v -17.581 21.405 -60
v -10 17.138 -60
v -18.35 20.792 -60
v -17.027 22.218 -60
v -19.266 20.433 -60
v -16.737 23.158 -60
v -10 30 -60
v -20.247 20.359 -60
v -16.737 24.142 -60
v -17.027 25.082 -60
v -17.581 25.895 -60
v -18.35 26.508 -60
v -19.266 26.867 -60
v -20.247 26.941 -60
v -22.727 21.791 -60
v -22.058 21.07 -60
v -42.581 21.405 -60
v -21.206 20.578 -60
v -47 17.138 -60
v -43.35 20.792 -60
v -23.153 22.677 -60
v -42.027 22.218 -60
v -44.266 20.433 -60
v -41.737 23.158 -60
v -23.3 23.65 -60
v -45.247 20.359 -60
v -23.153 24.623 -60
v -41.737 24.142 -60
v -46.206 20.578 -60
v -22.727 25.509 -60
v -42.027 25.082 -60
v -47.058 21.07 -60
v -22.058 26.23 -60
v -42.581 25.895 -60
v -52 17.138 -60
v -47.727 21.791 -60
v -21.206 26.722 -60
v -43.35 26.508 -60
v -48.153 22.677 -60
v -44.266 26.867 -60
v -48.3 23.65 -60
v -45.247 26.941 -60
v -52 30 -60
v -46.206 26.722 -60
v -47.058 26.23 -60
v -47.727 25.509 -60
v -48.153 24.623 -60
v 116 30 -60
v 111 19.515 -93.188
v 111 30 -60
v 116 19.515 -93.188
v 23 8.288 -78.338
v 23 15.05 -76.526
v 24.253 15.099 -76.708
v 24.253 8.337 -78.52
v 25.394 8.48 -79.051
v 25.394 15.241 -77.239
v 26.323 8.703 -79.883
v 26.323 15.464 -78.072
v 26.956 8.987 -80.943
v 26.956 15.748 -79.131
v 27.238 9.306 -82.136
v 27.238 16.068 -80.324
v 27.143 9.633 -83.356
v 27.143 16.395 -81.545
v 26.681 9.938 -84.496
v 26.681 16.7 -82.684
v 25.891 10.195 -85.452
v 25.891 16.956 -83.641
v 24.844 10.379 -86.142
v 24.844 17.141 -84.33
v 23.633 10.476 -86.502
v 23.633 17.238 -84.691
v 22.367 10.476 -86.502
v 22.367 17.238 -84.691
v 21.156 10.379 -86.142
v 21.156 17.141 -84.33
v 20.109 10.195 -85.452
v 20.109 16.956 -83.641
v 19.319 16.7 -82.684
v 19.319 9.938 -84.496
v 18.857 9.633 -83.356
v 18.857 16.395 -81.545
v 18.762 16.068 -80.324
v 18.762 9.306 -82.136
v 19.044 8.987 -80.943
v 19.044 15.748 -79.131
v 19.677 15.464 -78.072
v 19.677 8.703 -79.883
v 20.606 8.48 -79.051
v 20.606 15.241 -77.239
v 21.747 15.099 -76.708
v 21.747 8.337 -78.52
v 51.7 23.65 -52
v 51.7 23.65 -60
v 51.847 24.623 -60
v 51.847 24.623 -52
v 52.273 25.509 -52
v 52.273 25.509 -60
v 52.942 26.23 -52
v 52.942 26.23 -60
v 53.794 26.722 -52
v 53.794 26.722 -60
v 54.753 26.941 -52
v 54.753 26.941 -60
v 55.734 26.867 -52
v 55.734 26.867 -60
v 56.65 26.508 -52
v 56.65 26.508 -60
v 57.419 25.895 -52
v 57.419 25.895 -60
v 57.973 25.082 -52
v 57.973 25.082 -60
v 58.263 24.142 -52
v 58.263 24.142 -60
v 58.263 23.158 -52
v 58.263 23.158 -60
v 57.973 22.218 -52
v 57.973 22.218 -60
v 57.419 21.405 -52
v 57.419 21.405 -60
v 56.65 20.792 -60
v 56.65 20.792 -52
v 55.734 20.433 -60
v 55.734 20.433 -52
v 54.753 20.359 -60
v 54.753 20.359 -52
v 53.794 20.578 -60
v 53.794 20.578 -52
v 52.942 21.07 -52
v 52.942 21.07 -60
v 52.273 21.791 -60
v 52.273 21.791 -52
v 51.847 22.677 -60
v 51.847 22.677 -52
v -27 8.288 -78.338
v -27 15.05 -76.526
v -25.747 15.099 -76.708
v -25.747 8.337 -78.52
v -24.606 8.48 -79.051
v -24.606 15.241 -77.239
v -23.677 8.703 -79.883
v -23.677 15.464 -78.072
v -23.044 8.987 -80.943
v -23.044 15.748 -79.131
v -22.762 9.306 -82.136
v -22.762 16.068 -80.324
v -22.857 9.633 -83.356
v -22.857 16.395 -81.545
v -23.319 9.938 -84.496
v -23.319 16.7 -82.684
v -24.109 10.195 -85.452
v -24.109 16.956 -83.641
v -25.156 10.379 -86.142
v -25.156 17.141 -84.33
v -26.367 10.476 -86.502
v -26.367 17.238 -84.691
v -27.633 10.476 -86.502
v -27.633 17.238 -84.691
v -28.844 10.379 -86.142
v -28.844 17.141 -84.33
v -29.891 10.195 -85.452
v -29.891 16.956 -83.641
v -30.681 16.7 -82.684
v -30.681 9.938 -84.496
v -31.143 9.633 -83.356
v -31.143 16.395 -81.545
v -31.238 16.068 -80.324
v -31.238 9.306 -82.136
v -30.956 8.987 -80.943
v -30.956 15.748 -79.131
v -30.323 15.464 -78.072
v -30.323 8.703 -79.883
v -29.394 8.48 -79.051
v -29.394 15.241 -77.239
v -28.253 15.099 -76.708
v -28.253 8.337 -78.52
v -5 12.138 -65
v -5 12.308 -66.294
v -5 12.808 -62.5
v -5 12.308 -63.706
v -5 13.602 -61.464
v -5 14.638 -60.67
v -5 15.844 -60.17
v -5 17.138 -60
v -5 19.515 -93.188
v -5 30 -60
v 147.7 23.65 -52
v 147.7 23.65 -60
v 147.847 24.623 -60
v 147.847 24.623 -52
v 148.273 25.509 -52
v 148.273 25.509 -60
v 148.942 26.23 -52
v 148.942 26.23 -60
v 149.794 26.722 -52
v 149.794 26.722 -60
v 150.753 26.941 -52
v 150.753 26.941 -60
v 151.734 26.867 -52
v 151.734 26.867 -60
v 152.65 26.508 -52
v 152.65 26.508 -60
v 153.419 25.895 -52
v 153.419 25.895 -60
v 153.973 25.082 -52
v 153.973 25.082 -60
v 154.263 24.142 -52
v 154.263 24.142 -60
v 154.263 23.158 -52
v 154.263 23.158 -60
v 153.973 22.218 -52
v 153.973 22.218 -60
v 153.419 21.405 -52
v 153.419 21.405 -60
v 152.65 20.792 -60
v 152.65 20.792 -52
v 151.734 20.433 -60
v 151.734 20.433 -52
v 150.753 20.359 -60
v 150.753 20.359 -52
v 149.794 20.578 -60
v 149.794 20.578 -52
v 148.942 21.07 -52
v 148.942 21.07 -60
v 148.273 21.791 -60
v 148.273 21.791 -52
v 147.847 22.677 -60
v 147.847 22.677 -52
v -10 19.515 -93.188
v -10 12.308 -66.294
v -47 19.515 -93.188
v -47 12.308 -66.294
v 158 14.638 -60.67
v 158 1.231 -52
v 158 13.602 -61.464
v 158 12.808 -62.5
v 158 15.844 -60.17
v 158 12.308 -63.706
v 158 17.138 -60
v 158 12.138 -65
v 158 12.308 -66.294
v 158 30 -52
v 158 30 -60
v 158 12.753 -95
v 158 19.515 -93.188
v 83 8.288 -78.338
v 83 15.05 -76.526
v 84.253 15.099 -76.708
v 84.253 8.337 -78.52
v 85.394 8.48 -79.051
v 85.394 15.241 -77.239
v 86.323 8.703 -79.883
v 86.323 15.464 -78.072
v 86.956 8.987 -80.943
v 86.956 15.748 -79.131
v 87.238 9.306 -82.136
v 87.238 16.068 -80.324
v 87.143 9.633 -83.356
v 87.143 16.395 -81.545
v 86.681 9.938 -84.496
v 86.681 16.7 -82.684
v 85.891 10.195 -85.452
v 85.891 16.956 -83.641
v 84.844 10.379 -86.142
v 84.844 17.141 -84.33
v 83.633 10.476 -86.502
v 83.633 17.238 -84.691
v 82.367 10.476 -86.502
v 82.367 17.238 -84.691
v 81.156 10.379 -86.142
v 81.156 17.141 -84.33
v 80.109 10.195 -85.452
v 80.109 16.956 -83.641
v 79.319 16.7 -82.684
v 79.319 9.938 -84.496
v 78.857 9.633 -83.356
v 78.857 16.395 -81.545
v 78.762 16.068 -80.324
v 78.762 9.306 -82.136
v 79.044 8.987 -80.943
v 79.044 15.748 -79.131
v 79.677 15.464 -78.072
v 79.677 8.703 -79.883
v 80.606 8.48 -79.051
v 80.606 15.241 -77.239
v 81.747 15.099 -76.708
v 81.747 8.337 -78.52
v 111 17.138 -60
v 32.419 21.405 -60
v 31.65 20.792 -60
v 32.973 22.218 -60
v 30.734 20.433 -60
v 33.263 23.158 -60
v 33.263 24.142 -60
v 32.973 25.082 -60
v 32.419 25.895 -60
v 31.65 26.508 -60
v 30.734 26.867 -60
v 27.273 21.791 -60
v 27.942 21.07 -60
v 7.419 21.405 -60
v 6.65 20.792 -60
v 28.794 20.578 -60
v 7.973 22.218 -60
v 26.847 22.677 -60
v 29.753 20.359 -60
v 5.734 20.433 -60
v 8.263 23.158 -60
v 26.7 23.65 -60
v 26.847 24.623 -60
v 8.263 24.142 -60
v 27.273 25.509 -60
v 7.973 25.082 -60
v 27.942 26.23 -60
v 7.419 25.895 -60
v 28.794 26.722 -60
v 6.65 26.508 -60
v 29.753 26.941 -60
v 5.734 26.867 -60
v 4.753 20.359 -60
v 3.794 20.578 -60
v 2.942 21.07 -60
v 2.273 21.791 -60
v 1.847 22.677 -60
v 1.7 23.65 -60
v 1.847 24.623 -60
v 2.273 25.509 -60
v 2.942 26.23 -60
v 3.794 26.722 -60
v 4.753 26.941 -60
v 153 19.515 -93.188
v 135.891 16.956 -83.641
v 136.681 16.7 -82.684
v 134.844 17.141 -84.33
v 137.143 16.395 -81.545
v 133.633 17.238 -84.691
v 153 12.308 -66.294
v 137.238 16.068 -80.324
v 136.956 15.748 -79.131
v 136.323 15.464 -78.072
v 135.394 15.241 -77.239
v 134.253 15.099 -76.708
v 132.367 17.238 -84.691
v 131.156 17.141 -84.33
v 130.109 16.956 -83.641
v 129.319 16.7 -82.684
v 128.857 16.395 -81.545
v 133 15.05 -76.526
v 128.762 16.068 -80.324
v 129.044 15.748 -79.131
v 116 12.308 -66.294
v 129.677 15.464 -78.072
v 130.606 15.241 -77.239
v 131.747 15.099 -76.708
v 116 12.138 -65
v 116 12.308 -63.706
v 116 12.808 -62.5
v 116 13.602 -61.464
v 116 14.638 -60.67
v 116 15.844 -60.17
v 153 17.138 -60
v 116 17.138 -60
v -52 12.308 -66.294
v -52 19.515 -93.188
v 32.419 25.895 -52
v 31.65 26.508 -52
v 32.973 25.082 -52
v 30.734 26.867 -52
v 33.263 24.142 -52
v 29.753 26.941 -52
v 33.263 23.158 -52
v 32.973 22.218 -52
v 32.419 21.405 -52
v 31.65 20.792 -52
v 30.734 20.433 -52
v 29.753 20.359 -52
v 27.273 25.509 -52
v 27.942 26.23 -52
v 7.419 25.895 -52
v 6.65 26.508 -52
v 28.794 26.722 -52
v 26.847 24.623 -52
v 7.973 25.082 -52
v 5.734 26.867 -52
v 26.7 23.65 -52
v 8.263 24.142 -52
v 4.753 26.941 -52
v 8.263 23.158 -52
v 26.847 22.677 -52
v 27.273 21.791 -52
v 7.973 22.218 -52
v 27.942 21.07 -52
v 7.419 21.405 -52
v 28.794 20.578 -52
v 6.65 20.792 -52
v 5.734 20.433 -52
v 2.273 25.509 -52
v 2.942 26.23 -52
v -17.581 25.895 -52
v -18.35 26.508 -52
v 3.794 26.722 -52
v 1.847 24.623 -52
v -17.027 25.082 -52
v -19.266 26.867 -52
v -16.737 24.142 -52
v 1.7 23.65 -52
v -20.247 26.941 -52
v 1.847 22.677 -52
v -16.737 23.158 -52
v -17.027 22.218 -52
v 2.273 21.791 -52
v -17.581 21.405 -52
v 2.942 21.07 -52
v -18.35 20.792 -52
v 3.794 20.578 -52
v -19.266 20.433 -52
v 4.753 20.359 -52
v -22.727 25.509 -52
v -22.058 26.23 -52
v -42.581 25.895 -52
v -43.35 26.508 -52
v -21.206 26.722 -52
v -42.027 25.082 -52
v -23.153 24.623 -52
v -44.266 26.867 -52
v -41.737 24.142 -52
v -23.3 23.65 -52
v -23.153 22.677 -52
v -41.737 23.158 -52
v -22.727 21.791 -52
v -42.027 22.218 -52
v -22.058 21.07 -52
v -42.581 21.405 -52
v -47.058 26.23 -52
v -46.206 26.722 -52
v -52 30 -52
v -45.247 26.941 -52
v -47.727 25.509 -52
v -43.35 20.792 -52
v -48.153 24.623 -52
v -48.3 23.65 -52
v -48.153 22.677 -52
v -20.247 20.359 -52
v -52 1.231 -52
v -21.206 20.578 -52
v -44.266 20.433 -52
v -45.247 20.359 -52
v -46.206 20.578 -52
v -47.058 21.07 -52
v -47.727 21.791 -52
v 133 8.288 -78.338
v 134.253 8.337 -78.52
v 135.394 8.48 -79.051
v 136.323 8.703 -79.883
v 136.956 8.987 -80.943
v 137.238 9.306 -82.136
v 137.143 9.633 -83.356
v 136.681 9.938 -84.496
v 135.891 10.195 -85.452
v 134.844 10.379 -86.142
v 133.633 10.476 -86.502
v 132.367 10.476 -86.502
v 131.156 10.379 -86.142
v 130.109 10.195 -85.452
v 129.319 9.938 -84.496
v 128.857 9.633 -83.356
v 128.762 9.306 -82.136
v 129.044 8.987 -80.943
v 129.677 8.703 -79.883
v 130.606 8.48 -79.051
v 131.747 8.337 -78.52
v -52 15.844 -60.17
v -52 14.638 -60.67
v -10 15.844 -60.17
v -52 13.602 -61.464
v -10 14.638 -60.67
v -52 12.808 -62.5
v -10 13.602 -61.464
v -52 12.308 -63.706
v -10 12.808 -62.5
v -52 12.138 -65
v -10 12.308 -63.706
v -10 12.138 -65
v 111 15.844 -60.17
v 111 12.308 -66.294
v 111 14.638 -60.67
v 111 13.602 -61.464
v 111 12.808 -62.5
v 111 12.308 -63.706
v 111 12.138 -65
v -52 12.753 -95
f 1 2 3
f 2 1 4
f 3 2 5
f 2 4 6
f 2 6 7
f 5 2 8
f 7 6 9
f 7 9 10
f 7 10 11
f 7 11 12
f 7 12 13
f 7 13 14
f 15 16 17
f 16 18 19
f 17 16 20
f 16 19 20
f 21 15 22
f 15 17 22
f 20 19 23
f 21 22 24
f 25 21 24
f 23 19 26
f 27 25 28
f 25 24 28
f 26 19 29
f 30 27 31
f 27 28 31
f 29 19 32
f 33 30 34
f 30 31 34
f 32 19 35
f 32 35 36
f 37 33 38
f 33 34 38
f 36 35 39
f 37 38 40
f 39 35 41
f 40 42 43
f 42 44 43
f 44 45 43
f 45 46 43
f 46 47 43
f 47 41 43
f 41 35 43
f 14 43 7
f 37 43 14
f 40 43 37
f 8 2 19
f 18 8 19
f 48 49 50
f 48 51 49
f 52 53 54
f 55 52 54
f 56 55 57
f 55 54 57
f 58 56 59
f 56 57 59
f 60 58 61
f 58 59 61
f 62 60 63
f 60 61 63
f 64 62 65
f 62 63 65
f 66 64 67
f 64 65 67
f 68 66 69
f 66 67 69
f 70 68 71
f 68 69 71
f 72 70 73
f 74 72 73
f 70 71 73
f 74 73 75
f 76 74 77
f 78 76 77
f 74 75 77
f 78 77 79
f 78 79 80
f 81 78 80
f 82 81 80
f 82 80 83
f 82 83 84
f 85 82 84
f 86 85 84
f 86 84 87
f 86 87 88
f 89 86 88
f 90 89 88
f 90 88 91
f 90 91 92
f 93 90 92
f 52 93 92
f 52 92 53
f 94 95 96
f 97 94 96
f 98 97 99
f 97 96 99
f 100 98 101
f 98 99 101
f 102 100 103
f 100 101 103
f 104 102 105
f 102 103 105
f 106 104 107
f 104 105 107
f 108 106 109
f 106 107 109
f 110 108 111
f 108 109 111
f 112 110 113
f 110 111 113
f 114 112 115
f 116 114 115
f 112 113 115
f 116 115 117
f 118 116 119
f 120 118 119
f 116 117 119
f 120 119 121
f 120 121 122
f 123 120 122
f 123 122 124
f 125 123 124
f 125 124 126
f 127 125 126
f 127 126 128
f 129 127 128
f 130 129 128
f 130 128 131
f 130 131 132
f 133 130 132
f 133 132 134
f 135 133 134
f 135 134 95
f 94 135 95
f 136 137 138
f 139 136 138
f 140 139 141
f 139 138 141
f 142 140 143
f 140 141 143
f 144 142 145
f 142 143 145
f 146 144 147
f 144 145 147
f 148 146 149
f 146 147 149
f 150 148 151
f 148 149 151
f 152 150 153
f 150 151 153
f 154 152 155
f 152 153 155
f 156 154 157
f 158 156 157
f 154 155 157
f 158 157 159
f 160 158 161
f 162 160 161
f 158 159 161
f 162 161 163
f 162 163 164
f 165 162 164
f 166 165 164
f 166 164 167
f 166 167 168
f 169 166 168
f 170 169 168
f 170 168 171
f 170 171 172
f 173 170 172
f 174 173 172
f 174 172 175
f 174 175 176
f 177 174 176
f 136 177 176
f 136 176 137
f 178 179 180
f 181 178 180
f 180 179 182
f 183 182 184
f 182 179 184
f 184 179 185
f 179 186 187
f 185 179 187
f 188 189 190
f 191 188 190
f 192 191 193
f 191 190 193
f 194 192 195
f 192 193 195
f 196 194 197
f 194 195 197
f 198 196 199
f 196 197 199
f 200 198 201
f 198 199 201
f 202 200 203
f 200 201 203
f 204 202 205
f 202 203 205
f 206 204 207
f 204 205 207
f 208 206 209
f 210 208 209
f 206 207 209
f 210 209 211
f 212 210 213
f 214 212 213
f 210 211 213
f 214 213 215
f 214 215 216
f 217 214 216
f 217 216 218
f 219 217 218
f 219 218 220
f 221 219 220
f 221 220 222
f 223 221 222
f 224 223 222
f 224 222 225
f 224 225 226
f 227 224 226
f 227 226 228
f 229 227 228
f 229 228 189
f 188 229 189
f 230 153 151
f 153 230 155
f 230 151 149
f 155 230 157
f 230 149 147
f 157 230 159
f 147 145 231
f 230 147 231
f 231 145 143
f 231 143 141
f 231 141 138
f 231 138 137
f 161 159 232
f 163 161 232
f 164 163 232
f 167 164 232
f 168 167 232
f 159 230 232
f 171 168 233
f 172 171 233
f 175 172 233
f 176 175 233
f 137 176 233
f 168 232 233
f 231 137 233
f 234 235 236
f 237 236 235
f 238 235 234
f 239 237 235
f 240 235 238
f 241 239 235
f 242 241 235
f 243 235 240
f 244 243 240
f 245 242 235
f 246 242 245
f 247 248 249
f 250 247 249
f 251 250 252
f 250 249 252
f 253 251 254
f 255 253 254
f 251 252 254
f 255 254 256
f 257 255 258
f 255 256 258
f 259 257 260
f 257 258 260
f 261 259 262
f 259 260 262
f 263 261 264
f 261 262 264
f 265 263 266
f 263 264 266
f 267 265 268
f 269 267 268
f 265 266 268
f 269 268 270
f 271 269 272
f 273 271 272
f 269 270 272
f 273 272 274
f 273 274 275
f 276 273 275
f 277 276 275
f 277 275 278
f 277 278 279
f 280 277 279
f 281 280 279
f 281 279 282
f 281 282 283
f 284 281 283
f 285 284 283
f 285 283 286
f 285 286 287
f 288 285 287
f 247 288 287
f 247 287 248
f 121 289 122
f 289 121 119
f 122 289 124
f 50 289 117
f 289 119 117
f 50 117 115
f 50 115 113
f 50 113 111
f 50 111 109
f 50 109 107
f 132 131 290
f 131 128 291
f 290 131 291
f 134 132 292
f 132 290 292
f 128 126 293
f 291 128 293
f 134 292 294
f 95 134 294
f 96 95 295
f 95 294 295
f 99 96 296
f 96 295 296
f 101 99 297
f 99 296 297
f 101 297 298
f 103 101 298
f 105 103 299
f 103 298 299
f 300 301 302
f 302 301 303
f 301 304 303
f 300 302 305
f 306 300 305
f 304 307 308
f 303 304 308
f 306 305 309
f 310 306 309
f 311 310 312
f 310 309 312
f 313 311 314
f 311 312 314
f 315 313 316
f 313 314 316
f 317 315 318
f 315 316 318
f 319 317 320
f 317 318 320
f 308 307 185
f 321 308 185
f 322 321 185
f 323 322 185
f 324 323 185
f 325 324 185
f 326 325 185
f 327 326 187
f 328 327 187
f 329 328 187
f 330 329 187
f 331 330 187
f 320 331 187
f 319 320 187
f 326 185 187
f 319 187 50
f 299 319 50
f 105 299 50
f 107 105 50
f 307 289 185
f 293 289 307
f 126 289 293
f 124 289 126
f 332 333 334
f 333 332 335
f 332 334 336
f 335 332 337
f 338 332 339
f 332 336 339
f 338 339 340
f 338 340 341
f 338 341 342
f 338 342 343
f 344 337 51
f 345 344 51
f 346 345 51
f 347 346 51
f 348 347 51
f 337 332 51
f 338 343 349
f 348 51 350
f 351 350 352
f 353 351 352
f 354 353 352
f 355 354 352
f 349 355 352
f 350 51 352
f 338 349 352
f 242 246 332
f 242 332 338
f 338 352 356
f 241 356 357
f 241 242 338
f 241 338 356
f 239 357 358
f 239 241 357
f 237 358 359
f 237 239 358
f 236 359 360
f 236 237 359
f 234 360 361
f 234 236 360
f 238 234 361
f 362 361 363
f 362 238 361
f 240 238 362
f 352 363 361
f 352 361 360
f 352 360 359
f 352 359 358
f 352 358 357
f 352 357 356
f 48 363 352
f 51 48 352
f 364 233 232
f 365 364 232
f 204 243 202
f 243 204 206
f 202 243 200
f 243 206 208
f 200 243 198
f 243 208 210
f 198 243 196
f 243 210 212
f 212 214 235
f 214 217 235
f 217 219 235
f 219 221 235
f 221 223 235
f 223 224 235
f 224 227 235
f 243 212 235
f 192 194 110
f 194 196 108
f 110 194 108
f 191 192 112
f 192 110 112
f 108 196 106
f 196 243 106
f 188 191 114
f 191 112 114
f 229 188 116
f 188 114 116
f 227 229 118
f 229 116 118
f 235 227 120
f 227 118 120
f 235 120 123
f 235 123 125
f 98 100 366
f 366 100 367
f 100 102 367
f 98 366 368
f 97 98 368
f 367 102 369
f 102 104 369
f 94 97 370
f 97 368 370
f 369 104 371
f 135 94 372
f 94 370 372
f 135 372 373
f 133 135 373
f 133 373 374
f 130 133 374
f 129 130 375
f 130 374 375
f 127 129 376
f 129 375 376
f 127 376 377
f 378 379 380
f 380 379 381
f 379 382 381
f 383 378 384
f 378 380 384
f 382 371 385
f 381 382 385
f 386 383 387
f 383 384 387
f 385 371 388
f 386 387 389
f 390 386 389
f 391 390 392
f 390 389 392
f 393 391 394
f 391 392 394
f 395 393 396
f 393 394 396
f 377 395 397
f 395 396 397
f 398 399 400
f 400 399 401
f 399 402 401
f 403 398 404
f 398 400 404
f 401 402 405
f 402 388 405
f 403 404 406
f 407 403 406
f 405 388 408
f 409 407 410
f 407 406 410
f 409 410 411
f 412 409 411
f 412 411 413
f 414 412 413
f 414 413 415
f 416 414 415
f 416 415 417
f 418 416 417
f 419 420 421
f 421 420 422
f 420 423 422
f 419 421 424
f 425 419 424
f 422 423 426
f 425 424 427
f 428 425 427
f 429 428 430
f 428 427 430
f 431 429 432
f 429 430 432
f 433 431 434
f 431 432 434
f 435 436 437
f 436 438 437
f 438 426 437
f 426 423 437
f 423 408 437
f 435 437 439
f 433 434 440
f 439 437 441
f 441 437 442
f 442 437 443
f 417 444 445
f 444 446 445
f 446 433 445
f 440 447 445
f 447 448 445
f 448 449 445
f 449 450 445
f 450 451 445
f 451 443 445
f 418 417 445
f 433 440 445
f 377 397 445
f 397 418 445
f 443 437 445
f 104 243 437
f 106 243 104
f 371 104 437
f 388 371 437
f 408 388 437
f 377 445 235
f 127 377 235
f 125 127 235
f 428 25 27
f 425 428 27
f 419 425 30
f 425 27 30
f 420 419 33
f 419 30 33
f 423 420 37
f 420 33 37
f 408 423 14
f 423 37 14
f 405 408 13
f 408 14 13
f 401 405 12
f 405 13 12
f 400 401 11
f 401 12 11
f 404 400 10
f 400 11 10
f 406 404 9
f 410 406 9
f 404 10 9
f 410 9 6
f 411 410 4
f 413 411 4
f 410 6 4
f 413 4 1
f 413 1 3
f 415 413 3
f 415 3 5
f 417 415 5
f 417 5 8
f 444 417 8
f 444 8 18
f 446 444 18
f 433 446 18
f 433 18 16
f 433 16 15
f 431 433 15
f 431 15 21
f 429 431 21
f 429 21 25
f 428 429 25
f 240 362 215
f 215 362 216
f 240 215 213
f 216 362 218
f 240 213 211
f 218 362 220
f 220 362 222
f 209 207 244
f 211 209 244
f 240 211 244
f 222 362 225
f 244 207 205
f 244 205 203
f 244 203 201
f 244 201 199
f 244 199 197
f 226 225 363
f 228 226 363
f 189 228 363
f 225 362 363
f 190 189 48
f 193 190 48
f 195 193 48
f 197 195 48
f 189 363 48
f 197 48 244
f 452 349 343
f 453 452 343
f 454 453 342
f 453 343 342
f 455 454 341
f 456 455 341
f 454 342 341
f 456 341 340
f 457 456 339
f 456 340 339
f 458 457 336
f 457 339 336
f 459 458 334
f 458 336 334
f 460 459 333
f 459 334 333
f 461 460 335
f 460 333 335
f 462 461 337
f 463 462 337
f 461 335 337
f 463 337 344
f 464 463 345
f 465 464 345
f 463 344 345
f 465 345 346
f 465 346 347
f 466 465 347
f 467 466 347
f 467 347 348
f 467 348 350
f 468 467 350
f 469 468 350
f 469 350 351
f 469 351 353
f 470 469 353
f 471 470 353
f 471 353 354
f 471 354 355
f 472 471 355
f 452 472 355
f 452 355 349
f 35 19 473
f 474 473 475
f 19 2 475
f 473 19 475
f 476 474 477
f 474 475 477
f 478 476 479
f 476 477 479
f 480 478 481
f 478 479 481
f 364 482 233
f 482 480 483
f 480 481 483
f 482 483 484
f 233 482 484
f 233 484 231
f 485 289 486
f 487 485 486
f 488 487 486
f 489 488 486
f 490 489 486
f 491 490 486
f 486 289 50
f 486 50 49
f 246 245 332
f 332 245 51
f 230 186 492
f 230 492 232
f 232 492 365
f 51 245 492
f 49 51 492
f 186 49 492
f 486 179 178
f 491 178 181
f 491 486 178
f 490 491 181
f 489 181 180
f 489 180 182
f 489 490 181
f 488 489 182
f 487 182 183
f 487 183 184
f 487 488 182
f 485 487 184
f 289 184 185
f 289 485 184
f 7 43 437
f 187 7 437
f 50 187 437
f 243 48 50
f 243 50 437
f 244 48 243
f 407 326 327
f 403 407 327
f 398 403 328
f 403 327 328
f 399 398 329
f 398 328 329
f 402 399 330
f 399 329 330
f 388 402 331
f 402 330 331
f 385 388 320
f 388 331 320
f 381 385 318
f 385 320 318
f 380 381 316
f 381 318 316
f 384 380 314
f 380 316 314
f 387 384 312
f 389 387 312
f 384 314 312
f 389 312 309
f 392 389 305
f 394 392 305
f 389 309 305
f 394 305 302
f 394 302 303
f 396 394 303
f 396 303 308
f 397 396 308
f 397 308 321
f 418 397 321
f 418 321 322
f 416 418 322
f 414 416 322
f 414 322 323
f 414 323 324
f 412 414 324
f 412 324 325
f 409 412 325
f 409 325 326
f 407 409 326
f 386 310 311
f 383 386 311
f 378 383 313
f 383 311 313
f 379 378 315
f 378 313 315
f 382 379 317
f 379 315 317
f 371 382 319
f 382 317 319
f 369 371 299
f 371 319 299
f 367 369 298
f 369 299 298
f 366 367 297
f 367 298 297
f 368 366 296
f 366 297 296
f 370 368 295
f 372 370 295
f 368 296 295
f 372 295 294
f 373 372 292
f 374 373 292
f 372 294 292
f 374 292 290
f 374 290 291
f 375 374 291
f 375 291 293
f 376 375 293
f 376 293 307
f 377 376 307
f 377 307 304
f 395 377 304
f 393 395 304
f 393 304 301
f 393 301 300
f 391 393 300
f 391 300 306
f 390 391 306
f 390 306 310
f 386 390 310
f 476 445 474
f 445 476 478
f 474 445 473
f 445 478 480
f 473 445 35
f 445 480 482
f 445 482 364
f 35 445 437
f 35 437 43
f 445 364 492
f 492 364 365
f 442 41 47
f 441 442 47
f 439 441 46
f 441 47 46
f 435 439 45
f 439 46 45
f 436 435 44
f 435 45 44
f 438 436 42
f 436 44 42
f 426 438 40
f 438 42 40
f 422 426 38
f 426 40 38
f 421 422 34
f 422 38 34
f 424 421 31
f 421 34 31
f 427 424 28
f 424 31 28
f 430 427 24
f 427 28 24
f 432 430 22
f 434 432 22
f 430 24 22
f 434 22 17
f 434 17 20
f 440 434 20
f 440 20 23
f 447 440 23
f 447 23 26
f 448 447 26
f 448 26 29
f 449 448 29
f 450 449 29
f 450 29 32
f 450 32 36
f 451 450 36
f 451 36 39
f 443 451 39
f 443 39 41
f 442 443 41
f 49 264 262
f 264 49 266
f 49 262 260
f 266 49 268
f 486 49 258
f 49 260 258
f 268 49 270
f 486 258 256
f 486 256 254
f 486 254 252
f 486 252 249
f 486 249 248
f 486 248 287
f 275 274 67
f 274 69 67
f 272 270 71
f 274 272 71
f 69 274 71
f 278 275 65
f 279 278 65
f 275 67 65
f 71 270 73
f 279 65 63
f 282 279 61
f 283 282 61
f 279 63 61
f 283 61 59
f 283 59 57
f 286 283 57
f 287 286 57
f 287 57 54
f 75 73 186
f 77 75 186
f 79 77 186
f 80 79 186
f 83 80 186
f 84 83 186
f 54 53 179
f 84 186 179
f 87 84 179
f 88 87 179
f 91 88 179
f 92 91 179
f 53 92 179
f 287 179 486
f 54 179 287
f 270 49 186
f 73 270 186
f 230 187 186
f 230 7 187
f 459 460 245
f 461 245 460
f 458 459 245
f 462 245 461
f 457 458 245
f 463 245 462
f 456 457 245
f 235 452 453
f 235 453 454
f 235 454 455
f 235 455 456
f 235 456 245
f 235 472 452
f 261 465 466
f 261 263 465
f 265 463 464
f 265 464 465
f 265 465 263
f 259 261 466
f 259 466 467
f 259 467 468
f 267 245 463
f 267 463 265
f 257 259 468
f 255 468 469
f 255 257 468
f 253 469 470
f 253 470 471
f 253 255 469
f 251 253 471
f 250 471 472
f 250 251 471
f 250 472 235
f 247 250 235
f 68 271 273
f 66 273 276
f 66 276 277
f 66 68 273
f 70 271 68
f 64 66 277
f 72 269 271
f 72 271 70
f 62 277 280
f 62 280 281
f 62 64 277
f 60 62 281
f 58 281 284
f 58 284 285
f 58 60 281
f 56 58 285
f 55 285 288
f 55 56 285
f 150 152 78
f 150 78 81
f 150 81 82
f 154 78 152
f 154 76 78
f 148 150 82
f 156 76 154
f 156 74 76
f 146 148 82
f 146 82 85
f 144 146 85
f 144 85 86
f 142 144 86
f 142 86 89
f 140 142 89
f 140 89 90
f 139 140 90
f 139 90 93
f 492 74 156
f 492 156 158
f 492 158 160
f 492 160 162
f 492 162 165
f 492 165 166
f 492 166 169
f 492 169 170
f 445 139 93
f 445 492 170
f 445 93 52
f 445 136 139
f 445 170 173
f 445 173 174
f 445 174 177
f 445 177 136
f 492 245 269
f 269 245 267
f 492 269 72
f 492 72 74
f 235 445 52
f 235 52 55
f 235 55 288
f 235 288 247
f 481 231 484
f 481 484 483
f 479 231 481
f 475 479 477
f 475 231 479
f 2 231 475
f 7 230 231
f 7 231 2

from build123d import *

# Parameters (mm, degrees)
EXTRUDE_1_DEPTH      = 30
SKETCH_2_R           = 44.45
CUT_EXTRUDE_1_DEPTH  = 4
SKETCH_3_R           = 25.5
SKETCH_3_R_2         = 2.25
CUT_EXTRUDE_2_DEPTH  = 188.619295383
CUT_EXTRUDE_3_DEPTH  = 189.215302247
SKETCH_5_R           = 1.65
CUT_EXTRUDE_4_DEPTH  = 189.215302247
EXTRUDE_START        = -30
EXTRUDE_2_DEPTH      = 30
CUT_EXTRUDE_5_DEPTH  = 198.040604952
CUT_EXTRUDE_7_DEPTH  = 233.432785983
CUT_EXTRUDE_8_DEPTH  = 233.432785983
CUT_EXTRUDE_9_DEPTH  = 233.432785983
FILLET_1_R           = 5
CUT_EXTRUDE_10_DEPTH = 233.432785983
EXTRUDE_START_2      = -5
EXTRUDE_3_DEPTH      = 5
EXTRUDE_4_DEPTH      = 5
SKETCH_14_R          = 4.25
CUT_EXTRUDE_11_DEPTH = 189.364728478
SKETCH_16_W          = 43
SKETCH_16_H          = 30
CUT_EXTRUDE_12_DEPTH = 233.432785983
EXTRUDE_7_REACH      = 188.592
SKETCH_18_W          = 210
SKETCH_18_H          = 5
EXTRUDE_8_DEPTH      = 210
EXTRUDE_9_DEPTH      = 5
EXTRUDE_10_DEPTH     = 5
SKETCH_22_R          = 4.25
CUT_EXTRUDE_13_DEPTH = 187.984035343
FILLET_2_R           = 5
CUT_EXTRUDE_14_DEPTH = 234.418610938
EXTRUDE_11_DEPTH     = 2.5
EXTRUDE_12_DEPTH     = 2.5
CUT_EXTRUDE_START    = -5
CUT_EXTRUDE_15_DEPTH = 5
SKETCH_24_R          = 3.3
CUT_EXTRUDE_16_DEPTH = 165.58736282
CUT_EXTRUDE_17_DEPTH = 5


with BuildPart() as part:
    # 草图1 → 凸台-拉伸1 (new body)
    with BuildSketch(Plane(origin=(0, 0, 0), x_dir=(1, 0, 0), z_dir=(0, 1, 0))):
        with BuildLine():
            Line((170, 31.93), (170, -31.93))
            ThreePointArc((170, -31.93), (167.781993847, -38.210172909), (162.111885646, -41.704453387))
            Line((162.111885646, -41.704453387), (15.839142344, -73.308400404))
            ThreePointArc((15.839142344, -73.308400404), (-75, 0), (15.839142344, 73.308400404))
            Line((15.839142344, 73.308400404), (162.111885646, 41.704453387))
            ThreePointArc((162.111885646, 41.704453387), (167.781993847, 38.210172909), (170, 31.93))
        make_face()
    extrude(amount=EXTRUDE_1_DEPTH)

    # 草图2 → 切除-拉伸1 (cut)
    with BuildSketch(Plane(origin=(0, 30, 0), x_dir=(1, 0, 0), z_dir=(0, 1, 0))):
        with Locations(Location((0, 0, 0), (0, 0, 270))):
            Circle(SKETCH_2_R)
    extrude(amount=-CUT_EXTRUDE_1_DEPTH, mode=Mode.SUBTRACT)

    # 草图3 → 切除-拉伸2 (cut, through all)
    with BuildSketch(Plane(origin=(0, 26, 0), x_dir=(1, 0, 0), z_dir=(0, 1, 0))):
        with Locations(Location((0, 0, 0), (0, 0, 270))):
            Circle(SKETCH_3_R)
        with Locations(Location((0, 41, 0), (0, 0, 270))):
            Circle(SKETCH_3_R_2)
        with Locations(Location((28.991378029, 28.991378029, 0), (0, 0, 270))):
            Circle(SKETCH_3_R_2)
        with Locations(Location((41, 0, 0), (0, 0, 270))):
            Circle(SKETCH_3_R_2)
        with Locations(Location((28.991378029, -28.991378029, 0), (0, 0, 270))):
            Circle(SKETCH_3_R_2)
        with Locations(Location((0, -41, 0), (0, 0, 270))):
            Circle(SKETCH_3_R_2)
        with Locations(Location((-28.991378029, -28.991378029, 0), (0, 0, 270))):
            Circle(SKETCH_3_R_2)
        with Locations(Location((-41, 0, 0), (0, 0, 270))):
            Circle(SKETCH_3_R_2)
        with Locations(Location((-28.991378029, 28.991378029, 0), (0, 0, 270))):
            Circle(SKETCH_3_R_2)
    extrude(amount=-CUT_EXTRUDE_2_DEPTH, mode=Mode.SUBTRACT)

    # 草图4 → 切除-拉伸3 (cut, through all)
    with BuildSketch(Plane(origin=(0, 30, 0), x_dir=(1, 0, 0), z_dir=(0, 1, 0))):
        with BuildLine():
            Line((124, 18.5), (134, 18.5))
            ThreePointArc((134, 18.5), (152.5, 0), (134, -18.5))
            Line((134, -18.5), (124, -18.5))
            ThreePointArc((124, -18.5), (105.5, 0), (124, 18.5))
        make_face()
    extrude(amount=-CUT_EXTRUDE_3_DEPTH, mode=Mode.SUBTRACT)

    # 草图5 → 切除-拉伸4 (cut, through all)
    with BuildSketch(Plane(origin=(0, 30, 0), x_dir=(1, 0, 0), z_dir=(0, 1, 0))):
        with Locations(Location((116.75, 25.5, 0), (0, 0, 270))):
            Circle(SKETCH_5_R)
        with Locations(Location((141.25, 25.5, 0), (0, 0, 270))):
            Circle(SKETCH_5_R)
        with Locations(Location((141.25, -25.5, 0), (0, 0, 270))):
            Circle(SKETCH_5_R)
        with Locations(Location((116.75, -25.5, 0), (0, 0, 270))):
            Circle(SKETCH_5_R)
    extrude(amount=-CUT_EXTRUDE_4_DEPTH, mode=Mode.SUBTRACT)

    # 草图6 → 凸台-拉伸2 (add)
    with BuildSketch(Plane(origin=(0, 30, 0), x_dir=(1, 0, 0), z_dir=(0, 1, 0)).offset(EXTRUDE_START)):
        with BuildLine():
            Line((158, 95), (-52, 95))
            Line((-52, 95), (-52, 54.046276467))
            ThreePointArc((-52, 54.046276467), (-20.48558667, 72.148047366), (15.839142344, 73.308400404))
            Line((15.839142344, 73.308400404), (158, 42.592874655))
            Line((158, 42.592874655), (158, 95))
        make_face()
        with BuildLine():
            ThreePointArc((15.839142344, -73.308400404), (-20.48558667, -72.148047366), (-52, -54.046276467))
            Line((-52, -54.046276467), (-52, -95))
            Line((-52, -95), (158, -95))
            Line((158, -95), (158, -42.592874655))
            Line((158, -42.592874655), (15.839142344, -73.308400404))
        make_face()
    extrude(amount=EXTRUDE_2_DEPTH)

    # 草图7 → 切除-拉伸5 (cut, through all)
    with BuildSketch(Plane(origin=(0, 30, 0), x_dir=(1, 0, 0), z_dir=(0, 1, 0))):
        with BuildLine():
            Line((-52, 54.046276467), (-52, -54.046276467))
            ThreePointArc((-52, -54.046276467), (-75, 0), (-52, 54.046276467))
        make_face()
        with BuildLine():
            Line((158, 42.592874655), (158, -42.592874655))
            Line((158, -42.592874655), (162.111885646, -41.704453387))
            ThreePointArc((162.111885646, -41.704453387), (167.781993847, -38.210172909), (170, -31.93))
            Line((170, -31.93), (170, 31.93))
            ThreePointArc((170, 31.93), (167.781993847, 38.210172909), (162.111885646, 41.704453387))
            Line((162.111885646, 41.704453387), (158, 42.592874655))
        make_face()
    extrude(amount=-CUT_EXTRUDE_5_DEPTH, mode=Mode.SUBTRACT)

    # 草图9 → 切除-拉伸7 (cut, through all)
    with BuildSketch(Plane.ZY.offset(52)):
        Polygon((-95, 20), (-60, 10.621778265), (-60, 30), (-95, 30), align=None)
    extrude(amount=-CUT_EXTRUDE_7_DEPTH, mode=Mode.SUBTRACT)

    # 草图10 → 切除-拉伸8 (cut, through all)
    with BuildSketch(Plane.ZY.offset(52)):
        Polygon((-95, 12.753066737), (-52, 1.231251463), (-52, 0), (-95, 0), align=None)
    extrude(amount=-CUT_EXTRUDE_8_DEPTH, mode=Mode.SUBTRACT)

    # 草图8 → 切除-拉伸9 (cut, through all)
    with BuildSketch(Plane.ZY.offset(52)):
        Polygon((0, 0), (52, 0), (52, 17.3), (-52, 17.3), (-52, 0), align=None)
    extrude(amount=-CUT_EXTRUDE_9_DEPTH, mode=Mode.SUBTRACT)

    # 圆角1
    fillet_1_edges = [part.edges().sort_by_distance(p)[0] for p in [
        (53, 10.621778265, -60),
    ]]
    fillet(fillet_1_edges, radius=FILLET_1_R)

    # 草图11 → 切除-拉伸10 (cut, through all)
    with BuildSketch(Plane.ZY.offset(52)):
        Polygon((-95, 12.753066737), (-93.188266684, 19.514547521), (-95, 20), align=None)
    extrude(amount=-CUT_EXTRUDE_10_DEPTH, mode=Mode.SUBTRACT)

    # 草图12 → 凸台-拉伸3 (add)
    with BuildSketch(Plane.ZY.offset(52).offset(EXTRUDE_START_2)):
        with BuildLine():
            Line((-93.188266684, 19.514547521), (-60, 30))
            Line((-60, 30), (-60, 17.137905129))
            ThreePointArc((-60, 17.137905129), (-61.956192855, 13.171138428), (-66.294095226, 12.308275998))
            Line((-66.294095226, 12.308275998), (-93.188266684, 19.514547521))
        make_face()
    extrude(amount=EXTRUDE_3_DEPTH)

    # 草图13 → 凸台-拉伸4 (add)
    with BuildSketch(Plane(origin=(158, 0, 0), x_dir=(0, 0, -1), z_dir=(1, 0, 0))):
        with BuildLine():
            Line((66.294095226, 12.308275998), (93.188266684, 19.514547521))
            Line((93.188266684, 19.514547521), (60, 30))
            Line((60, 30), (60, 17.137905129))
            ThreePointArc((60, 17.137905129), (61.956192855, 13.171138428), (66.294095226, 12.308275998))
        make_face()
    extrude(amount=-EXTRUDE_4_DEPTH)

    # 草图14 → 切除-拉伸11 (cut, through all)
    with BuildSketch(Plane(origin=(0, -5.089745962, -1.36379332), x_dir=(1, 0, 0), z_dir=(0, 0.9659258262890681, 0.2588190451025214))):
        with Locations(Location((-27, 82.063690052, 0), (0, 0, 270))):
            Circle(SKETCH_14_R)
        with Locations(Location((23, 82.063690052, 0), (0, 0, 270))):
            Circle(SKETCH_14_R)
        with Locations(Location((83, 82.063690052, 0), (0, 0, 270))):
            Circle(SKETCH_14_R)
        with Locations(Location((133, 82.063690052, 0), (0, 0, 270))):
            Circle(SKETCH_14_R)
    extrude(amount=-CUT_EXTRUDE_11_DEPTH, mode=Mode.SUBTRACT)

    # 草图16 → 切除-拉伸12 (cut, through all)
    with BuildSketch(Plane.ZY.offset(52)):
        with Locations((73.5, 15)):
            Rectangle(SKETCH_16_W, SKETCH_16_H)
    extrude(amount=-CUT_EXTRUDE_12_DEPTH, mode=Mode.SUBTRACT)

    # 凸台-拉伸7: up to this plane
    extrude_7_end = Plane(origin=(0, -11.851226746, -3.175526636), z_dir=(0, -0.9659258262890681, -0.25881904510252146))
    # 草图18 → 凸台-拉伸7 (add, up to the surface)
    with BuildSketch(Plane(origin=(0, 30, 0), x_dir=(1, 0, 0), z_dir=(0, 1, 0)), mode=Mode.PRIVATE) as extrude_7_sk1:
        with Locations((53, -54.5)):
            Rectangle(SKETCH_18_W, SKETCH_18_H)
    extrude_7_tool1 = split(extrude(extrude_7_sk1.sketch, amount=-EXTRUDE_7_REACH, mode=Mode.PRIVATE), bisect_by=extrude_7_end, keep=Keep.BOTH, mode=Mode.PRIVATE)
    add(extrude_7_tool1.solids().sort_by_distance((53, 30, 54.5))[0])

    # 草图19 → 凸台-拉伸8 (add)
    with BuildSketch(Plane.ZY.offset(52)):
        Polygon((57, -27.975210512), (90.188266684, -36.867979769), (92, -30.106498985), (57, -20.72827725), align=None)
    extrude(amount=-EXTRUDE_8_DEPTH)

    # 草图20 → 凸台-拉伸9 (add)
    with BuildSketch(Plane.ZY.offset(52)):
        Polygon((92, -30.106498985), (57, -20.72827725), (57, 30), align=None)
    extrude(amount=-EXTRUDE_9_DEPTH)

    # 草图21 → 凸台-拉伸10 (add)
    with BuildSketch(Plane(origin=(158, 0, 0), x_dir=(0, 0, -1), z_dir=(1, 0, 0))):
        Polygon((-57, 30), (-92, -30.106498985), (-57, -20.72827725), align=None)
    extrude(amount=-EXTRUDE_10_DEPTH)

    # 草图22 → 切除-拉伸13 (cut, through all)
    with BuildSketch(Plane(origin=(0, -5.089745962, -1.36379332), x_dir=(1, 0, 0), z_dir=(0, 0.9659258262890686, 0.25881904510251946))):
        with Locations(Location((-27, -77.936309948, 0), (0, 0, 270))):
            Circle(SKETCH_22_R)
        with Locations(Location((23, -69.936309948, 0), (0, 0, 270))):
            Circle(SKETCH_22_R)
        with Locations(Location((83, -69.936309948, 0), (0, 0, 270))):
            Circle(SKETCH_22_R)
        with Locations(Location((133, -77.936309948, 0), (0, 0, 270))):
            Circle(SKETCH_22_R)
    extrude(amount=-CUT_EXTRUDE_13_DEPTH, mode=Mode.SUBTRACT)

    # 圆角2
    fillet_2_edges = [part.edges().sort_by_distance(p)[0] for p in [
        (53, -20.72827725, 57),
    ]]
    fillet(fillet_2_edges, radius=FILLET_2_R)

    # 草图23 → 切除-拉伸14 (cut, through all)
    with BuildSketch(Plane.ZY.offset(52)):
        Polygon((-52, 17.3), (-52, 40.52409207), (98.672945053, 40.52409207), (98.672945053, -43.91232927), (-52, -43.91232927), align=None)
    extrude(amount=-CUT_EXTRUDE_14_DEPTH, mode=Mode.SUBTRACT)

    # 草图25 → 凸台-拉伸11 (add, symmetric)
    with BuildSketch(Plane.ZY.offset(7.5)):
        with BuildLine():
            Line((-93.188266684, 19.514547521), (-66.294095226, 12.308275998))
            ThreePointArc((-66.294095226, 12.308275998), (-61.956192855, 13.171138428), (-60, 17.137905129))
            Line((-60, 17.137905129), (-60, 30))
            Line((-60, 30), (-93.188266684, 19.514547521))
        make_face()
    extrude(amount=EXTRUDE_11_DEPTH, both=True)

    # 草图26 → 凸台-拉伸12 (add, symmetric)
    with BuildSketch(Plane(origin=(113.5, 0, 0), x_dir=(0, 0, -1), z_dir=(1, 0, 0))):
        with BuildLine():
            Line((60, 30), (60, 17.137905129))
            ThreePointArc((60, 17.137905129), (61.956192855, 13.171138428), (66.294095226, 12.308275998))
            Line((66.294095226, 12.308275998), (93.188266684, 19.514547521))
            Line((93.188266684, 19.514547521), (60, 30))
        make_face()
    extrude(amount=EXTRUDE_12_DEPTH, both=True)

    # 草图27 → 切除-拉伸15 (cut)
    with BuildSketch(Plane.ZY.offset(-153).offset(CUT_EXTRUDE_START)):
        with BuildLine():
            Line((-60, 17.137905129), (-60, 30))
            Line((-60, 30), (-93.188266684, 19.514547521))
            Line((-93.188266684, 19.514547521), (-66.294095226, 12.308275998))
            ThreePointArc((-66.294095226, 12.308275998), (-61.956192855, 13.171138428), (-60, 17.137905129))
        make_face()
    extrude(amount=CUT_EXTRUDE_15_DEPTH, mode=Mode.SUBTRACT)

    # 草图24 → 切除-拉伸16 (cut, through all)
    with BuildSketch(Plane(origin=(0, 0, -60), x_dir=(-1, 0, 0), z_dir=(0, 0, -1))):
        with Locations((-151, 23.65)):
            Circle(SKETCH_24_R)
        with Locations((45, 23.65)):
            Circle(SKETCH_24_R)
        with Locations((20, 23.65)):
            Circle(SKETCH_24_R)
        with Locations((-5, 23.65)):
            Circle(SKETCH_24_R)
        with Locations((-30, 23.65)):
            Circle(SKETCH_24_R)
        with Locations((-55, 23.65)):
            Circle(SKETCH_24_R)
    extrude(amount=-CUT_EXTRUDE_16_DEPTH, mode=Mode.SUBTRACT)

    # 草图28 → 切除-拉伸17 (cut)
    with BuildSketch(Plane(origin=(-47, 0, 0), x_dir=(0, 0, -1), z_dir=(1, 0, 0))):
        with BuildLine():
            Line((66.294095226, 12.308275998), (93.188266684, 19.514547521))
            Line((93.188266684, 19.514547521), (60, 30))
            Line((60, 30), (60, 26.27488095))
            Line((60, 26.27488095), (60, 21.02511905))
            Line((60, 21.02511905), (60, 17.137905129))
            ThreePointArc((60, 17.137905129), (61.956192855, 13.171138428), (66.294095226, 12.308275998))
        make_face()
    extrude(amount=-CUT_EXTRUDE_17_DEPTH, mode=Mode.SUBTRACT)


solid = part.part
